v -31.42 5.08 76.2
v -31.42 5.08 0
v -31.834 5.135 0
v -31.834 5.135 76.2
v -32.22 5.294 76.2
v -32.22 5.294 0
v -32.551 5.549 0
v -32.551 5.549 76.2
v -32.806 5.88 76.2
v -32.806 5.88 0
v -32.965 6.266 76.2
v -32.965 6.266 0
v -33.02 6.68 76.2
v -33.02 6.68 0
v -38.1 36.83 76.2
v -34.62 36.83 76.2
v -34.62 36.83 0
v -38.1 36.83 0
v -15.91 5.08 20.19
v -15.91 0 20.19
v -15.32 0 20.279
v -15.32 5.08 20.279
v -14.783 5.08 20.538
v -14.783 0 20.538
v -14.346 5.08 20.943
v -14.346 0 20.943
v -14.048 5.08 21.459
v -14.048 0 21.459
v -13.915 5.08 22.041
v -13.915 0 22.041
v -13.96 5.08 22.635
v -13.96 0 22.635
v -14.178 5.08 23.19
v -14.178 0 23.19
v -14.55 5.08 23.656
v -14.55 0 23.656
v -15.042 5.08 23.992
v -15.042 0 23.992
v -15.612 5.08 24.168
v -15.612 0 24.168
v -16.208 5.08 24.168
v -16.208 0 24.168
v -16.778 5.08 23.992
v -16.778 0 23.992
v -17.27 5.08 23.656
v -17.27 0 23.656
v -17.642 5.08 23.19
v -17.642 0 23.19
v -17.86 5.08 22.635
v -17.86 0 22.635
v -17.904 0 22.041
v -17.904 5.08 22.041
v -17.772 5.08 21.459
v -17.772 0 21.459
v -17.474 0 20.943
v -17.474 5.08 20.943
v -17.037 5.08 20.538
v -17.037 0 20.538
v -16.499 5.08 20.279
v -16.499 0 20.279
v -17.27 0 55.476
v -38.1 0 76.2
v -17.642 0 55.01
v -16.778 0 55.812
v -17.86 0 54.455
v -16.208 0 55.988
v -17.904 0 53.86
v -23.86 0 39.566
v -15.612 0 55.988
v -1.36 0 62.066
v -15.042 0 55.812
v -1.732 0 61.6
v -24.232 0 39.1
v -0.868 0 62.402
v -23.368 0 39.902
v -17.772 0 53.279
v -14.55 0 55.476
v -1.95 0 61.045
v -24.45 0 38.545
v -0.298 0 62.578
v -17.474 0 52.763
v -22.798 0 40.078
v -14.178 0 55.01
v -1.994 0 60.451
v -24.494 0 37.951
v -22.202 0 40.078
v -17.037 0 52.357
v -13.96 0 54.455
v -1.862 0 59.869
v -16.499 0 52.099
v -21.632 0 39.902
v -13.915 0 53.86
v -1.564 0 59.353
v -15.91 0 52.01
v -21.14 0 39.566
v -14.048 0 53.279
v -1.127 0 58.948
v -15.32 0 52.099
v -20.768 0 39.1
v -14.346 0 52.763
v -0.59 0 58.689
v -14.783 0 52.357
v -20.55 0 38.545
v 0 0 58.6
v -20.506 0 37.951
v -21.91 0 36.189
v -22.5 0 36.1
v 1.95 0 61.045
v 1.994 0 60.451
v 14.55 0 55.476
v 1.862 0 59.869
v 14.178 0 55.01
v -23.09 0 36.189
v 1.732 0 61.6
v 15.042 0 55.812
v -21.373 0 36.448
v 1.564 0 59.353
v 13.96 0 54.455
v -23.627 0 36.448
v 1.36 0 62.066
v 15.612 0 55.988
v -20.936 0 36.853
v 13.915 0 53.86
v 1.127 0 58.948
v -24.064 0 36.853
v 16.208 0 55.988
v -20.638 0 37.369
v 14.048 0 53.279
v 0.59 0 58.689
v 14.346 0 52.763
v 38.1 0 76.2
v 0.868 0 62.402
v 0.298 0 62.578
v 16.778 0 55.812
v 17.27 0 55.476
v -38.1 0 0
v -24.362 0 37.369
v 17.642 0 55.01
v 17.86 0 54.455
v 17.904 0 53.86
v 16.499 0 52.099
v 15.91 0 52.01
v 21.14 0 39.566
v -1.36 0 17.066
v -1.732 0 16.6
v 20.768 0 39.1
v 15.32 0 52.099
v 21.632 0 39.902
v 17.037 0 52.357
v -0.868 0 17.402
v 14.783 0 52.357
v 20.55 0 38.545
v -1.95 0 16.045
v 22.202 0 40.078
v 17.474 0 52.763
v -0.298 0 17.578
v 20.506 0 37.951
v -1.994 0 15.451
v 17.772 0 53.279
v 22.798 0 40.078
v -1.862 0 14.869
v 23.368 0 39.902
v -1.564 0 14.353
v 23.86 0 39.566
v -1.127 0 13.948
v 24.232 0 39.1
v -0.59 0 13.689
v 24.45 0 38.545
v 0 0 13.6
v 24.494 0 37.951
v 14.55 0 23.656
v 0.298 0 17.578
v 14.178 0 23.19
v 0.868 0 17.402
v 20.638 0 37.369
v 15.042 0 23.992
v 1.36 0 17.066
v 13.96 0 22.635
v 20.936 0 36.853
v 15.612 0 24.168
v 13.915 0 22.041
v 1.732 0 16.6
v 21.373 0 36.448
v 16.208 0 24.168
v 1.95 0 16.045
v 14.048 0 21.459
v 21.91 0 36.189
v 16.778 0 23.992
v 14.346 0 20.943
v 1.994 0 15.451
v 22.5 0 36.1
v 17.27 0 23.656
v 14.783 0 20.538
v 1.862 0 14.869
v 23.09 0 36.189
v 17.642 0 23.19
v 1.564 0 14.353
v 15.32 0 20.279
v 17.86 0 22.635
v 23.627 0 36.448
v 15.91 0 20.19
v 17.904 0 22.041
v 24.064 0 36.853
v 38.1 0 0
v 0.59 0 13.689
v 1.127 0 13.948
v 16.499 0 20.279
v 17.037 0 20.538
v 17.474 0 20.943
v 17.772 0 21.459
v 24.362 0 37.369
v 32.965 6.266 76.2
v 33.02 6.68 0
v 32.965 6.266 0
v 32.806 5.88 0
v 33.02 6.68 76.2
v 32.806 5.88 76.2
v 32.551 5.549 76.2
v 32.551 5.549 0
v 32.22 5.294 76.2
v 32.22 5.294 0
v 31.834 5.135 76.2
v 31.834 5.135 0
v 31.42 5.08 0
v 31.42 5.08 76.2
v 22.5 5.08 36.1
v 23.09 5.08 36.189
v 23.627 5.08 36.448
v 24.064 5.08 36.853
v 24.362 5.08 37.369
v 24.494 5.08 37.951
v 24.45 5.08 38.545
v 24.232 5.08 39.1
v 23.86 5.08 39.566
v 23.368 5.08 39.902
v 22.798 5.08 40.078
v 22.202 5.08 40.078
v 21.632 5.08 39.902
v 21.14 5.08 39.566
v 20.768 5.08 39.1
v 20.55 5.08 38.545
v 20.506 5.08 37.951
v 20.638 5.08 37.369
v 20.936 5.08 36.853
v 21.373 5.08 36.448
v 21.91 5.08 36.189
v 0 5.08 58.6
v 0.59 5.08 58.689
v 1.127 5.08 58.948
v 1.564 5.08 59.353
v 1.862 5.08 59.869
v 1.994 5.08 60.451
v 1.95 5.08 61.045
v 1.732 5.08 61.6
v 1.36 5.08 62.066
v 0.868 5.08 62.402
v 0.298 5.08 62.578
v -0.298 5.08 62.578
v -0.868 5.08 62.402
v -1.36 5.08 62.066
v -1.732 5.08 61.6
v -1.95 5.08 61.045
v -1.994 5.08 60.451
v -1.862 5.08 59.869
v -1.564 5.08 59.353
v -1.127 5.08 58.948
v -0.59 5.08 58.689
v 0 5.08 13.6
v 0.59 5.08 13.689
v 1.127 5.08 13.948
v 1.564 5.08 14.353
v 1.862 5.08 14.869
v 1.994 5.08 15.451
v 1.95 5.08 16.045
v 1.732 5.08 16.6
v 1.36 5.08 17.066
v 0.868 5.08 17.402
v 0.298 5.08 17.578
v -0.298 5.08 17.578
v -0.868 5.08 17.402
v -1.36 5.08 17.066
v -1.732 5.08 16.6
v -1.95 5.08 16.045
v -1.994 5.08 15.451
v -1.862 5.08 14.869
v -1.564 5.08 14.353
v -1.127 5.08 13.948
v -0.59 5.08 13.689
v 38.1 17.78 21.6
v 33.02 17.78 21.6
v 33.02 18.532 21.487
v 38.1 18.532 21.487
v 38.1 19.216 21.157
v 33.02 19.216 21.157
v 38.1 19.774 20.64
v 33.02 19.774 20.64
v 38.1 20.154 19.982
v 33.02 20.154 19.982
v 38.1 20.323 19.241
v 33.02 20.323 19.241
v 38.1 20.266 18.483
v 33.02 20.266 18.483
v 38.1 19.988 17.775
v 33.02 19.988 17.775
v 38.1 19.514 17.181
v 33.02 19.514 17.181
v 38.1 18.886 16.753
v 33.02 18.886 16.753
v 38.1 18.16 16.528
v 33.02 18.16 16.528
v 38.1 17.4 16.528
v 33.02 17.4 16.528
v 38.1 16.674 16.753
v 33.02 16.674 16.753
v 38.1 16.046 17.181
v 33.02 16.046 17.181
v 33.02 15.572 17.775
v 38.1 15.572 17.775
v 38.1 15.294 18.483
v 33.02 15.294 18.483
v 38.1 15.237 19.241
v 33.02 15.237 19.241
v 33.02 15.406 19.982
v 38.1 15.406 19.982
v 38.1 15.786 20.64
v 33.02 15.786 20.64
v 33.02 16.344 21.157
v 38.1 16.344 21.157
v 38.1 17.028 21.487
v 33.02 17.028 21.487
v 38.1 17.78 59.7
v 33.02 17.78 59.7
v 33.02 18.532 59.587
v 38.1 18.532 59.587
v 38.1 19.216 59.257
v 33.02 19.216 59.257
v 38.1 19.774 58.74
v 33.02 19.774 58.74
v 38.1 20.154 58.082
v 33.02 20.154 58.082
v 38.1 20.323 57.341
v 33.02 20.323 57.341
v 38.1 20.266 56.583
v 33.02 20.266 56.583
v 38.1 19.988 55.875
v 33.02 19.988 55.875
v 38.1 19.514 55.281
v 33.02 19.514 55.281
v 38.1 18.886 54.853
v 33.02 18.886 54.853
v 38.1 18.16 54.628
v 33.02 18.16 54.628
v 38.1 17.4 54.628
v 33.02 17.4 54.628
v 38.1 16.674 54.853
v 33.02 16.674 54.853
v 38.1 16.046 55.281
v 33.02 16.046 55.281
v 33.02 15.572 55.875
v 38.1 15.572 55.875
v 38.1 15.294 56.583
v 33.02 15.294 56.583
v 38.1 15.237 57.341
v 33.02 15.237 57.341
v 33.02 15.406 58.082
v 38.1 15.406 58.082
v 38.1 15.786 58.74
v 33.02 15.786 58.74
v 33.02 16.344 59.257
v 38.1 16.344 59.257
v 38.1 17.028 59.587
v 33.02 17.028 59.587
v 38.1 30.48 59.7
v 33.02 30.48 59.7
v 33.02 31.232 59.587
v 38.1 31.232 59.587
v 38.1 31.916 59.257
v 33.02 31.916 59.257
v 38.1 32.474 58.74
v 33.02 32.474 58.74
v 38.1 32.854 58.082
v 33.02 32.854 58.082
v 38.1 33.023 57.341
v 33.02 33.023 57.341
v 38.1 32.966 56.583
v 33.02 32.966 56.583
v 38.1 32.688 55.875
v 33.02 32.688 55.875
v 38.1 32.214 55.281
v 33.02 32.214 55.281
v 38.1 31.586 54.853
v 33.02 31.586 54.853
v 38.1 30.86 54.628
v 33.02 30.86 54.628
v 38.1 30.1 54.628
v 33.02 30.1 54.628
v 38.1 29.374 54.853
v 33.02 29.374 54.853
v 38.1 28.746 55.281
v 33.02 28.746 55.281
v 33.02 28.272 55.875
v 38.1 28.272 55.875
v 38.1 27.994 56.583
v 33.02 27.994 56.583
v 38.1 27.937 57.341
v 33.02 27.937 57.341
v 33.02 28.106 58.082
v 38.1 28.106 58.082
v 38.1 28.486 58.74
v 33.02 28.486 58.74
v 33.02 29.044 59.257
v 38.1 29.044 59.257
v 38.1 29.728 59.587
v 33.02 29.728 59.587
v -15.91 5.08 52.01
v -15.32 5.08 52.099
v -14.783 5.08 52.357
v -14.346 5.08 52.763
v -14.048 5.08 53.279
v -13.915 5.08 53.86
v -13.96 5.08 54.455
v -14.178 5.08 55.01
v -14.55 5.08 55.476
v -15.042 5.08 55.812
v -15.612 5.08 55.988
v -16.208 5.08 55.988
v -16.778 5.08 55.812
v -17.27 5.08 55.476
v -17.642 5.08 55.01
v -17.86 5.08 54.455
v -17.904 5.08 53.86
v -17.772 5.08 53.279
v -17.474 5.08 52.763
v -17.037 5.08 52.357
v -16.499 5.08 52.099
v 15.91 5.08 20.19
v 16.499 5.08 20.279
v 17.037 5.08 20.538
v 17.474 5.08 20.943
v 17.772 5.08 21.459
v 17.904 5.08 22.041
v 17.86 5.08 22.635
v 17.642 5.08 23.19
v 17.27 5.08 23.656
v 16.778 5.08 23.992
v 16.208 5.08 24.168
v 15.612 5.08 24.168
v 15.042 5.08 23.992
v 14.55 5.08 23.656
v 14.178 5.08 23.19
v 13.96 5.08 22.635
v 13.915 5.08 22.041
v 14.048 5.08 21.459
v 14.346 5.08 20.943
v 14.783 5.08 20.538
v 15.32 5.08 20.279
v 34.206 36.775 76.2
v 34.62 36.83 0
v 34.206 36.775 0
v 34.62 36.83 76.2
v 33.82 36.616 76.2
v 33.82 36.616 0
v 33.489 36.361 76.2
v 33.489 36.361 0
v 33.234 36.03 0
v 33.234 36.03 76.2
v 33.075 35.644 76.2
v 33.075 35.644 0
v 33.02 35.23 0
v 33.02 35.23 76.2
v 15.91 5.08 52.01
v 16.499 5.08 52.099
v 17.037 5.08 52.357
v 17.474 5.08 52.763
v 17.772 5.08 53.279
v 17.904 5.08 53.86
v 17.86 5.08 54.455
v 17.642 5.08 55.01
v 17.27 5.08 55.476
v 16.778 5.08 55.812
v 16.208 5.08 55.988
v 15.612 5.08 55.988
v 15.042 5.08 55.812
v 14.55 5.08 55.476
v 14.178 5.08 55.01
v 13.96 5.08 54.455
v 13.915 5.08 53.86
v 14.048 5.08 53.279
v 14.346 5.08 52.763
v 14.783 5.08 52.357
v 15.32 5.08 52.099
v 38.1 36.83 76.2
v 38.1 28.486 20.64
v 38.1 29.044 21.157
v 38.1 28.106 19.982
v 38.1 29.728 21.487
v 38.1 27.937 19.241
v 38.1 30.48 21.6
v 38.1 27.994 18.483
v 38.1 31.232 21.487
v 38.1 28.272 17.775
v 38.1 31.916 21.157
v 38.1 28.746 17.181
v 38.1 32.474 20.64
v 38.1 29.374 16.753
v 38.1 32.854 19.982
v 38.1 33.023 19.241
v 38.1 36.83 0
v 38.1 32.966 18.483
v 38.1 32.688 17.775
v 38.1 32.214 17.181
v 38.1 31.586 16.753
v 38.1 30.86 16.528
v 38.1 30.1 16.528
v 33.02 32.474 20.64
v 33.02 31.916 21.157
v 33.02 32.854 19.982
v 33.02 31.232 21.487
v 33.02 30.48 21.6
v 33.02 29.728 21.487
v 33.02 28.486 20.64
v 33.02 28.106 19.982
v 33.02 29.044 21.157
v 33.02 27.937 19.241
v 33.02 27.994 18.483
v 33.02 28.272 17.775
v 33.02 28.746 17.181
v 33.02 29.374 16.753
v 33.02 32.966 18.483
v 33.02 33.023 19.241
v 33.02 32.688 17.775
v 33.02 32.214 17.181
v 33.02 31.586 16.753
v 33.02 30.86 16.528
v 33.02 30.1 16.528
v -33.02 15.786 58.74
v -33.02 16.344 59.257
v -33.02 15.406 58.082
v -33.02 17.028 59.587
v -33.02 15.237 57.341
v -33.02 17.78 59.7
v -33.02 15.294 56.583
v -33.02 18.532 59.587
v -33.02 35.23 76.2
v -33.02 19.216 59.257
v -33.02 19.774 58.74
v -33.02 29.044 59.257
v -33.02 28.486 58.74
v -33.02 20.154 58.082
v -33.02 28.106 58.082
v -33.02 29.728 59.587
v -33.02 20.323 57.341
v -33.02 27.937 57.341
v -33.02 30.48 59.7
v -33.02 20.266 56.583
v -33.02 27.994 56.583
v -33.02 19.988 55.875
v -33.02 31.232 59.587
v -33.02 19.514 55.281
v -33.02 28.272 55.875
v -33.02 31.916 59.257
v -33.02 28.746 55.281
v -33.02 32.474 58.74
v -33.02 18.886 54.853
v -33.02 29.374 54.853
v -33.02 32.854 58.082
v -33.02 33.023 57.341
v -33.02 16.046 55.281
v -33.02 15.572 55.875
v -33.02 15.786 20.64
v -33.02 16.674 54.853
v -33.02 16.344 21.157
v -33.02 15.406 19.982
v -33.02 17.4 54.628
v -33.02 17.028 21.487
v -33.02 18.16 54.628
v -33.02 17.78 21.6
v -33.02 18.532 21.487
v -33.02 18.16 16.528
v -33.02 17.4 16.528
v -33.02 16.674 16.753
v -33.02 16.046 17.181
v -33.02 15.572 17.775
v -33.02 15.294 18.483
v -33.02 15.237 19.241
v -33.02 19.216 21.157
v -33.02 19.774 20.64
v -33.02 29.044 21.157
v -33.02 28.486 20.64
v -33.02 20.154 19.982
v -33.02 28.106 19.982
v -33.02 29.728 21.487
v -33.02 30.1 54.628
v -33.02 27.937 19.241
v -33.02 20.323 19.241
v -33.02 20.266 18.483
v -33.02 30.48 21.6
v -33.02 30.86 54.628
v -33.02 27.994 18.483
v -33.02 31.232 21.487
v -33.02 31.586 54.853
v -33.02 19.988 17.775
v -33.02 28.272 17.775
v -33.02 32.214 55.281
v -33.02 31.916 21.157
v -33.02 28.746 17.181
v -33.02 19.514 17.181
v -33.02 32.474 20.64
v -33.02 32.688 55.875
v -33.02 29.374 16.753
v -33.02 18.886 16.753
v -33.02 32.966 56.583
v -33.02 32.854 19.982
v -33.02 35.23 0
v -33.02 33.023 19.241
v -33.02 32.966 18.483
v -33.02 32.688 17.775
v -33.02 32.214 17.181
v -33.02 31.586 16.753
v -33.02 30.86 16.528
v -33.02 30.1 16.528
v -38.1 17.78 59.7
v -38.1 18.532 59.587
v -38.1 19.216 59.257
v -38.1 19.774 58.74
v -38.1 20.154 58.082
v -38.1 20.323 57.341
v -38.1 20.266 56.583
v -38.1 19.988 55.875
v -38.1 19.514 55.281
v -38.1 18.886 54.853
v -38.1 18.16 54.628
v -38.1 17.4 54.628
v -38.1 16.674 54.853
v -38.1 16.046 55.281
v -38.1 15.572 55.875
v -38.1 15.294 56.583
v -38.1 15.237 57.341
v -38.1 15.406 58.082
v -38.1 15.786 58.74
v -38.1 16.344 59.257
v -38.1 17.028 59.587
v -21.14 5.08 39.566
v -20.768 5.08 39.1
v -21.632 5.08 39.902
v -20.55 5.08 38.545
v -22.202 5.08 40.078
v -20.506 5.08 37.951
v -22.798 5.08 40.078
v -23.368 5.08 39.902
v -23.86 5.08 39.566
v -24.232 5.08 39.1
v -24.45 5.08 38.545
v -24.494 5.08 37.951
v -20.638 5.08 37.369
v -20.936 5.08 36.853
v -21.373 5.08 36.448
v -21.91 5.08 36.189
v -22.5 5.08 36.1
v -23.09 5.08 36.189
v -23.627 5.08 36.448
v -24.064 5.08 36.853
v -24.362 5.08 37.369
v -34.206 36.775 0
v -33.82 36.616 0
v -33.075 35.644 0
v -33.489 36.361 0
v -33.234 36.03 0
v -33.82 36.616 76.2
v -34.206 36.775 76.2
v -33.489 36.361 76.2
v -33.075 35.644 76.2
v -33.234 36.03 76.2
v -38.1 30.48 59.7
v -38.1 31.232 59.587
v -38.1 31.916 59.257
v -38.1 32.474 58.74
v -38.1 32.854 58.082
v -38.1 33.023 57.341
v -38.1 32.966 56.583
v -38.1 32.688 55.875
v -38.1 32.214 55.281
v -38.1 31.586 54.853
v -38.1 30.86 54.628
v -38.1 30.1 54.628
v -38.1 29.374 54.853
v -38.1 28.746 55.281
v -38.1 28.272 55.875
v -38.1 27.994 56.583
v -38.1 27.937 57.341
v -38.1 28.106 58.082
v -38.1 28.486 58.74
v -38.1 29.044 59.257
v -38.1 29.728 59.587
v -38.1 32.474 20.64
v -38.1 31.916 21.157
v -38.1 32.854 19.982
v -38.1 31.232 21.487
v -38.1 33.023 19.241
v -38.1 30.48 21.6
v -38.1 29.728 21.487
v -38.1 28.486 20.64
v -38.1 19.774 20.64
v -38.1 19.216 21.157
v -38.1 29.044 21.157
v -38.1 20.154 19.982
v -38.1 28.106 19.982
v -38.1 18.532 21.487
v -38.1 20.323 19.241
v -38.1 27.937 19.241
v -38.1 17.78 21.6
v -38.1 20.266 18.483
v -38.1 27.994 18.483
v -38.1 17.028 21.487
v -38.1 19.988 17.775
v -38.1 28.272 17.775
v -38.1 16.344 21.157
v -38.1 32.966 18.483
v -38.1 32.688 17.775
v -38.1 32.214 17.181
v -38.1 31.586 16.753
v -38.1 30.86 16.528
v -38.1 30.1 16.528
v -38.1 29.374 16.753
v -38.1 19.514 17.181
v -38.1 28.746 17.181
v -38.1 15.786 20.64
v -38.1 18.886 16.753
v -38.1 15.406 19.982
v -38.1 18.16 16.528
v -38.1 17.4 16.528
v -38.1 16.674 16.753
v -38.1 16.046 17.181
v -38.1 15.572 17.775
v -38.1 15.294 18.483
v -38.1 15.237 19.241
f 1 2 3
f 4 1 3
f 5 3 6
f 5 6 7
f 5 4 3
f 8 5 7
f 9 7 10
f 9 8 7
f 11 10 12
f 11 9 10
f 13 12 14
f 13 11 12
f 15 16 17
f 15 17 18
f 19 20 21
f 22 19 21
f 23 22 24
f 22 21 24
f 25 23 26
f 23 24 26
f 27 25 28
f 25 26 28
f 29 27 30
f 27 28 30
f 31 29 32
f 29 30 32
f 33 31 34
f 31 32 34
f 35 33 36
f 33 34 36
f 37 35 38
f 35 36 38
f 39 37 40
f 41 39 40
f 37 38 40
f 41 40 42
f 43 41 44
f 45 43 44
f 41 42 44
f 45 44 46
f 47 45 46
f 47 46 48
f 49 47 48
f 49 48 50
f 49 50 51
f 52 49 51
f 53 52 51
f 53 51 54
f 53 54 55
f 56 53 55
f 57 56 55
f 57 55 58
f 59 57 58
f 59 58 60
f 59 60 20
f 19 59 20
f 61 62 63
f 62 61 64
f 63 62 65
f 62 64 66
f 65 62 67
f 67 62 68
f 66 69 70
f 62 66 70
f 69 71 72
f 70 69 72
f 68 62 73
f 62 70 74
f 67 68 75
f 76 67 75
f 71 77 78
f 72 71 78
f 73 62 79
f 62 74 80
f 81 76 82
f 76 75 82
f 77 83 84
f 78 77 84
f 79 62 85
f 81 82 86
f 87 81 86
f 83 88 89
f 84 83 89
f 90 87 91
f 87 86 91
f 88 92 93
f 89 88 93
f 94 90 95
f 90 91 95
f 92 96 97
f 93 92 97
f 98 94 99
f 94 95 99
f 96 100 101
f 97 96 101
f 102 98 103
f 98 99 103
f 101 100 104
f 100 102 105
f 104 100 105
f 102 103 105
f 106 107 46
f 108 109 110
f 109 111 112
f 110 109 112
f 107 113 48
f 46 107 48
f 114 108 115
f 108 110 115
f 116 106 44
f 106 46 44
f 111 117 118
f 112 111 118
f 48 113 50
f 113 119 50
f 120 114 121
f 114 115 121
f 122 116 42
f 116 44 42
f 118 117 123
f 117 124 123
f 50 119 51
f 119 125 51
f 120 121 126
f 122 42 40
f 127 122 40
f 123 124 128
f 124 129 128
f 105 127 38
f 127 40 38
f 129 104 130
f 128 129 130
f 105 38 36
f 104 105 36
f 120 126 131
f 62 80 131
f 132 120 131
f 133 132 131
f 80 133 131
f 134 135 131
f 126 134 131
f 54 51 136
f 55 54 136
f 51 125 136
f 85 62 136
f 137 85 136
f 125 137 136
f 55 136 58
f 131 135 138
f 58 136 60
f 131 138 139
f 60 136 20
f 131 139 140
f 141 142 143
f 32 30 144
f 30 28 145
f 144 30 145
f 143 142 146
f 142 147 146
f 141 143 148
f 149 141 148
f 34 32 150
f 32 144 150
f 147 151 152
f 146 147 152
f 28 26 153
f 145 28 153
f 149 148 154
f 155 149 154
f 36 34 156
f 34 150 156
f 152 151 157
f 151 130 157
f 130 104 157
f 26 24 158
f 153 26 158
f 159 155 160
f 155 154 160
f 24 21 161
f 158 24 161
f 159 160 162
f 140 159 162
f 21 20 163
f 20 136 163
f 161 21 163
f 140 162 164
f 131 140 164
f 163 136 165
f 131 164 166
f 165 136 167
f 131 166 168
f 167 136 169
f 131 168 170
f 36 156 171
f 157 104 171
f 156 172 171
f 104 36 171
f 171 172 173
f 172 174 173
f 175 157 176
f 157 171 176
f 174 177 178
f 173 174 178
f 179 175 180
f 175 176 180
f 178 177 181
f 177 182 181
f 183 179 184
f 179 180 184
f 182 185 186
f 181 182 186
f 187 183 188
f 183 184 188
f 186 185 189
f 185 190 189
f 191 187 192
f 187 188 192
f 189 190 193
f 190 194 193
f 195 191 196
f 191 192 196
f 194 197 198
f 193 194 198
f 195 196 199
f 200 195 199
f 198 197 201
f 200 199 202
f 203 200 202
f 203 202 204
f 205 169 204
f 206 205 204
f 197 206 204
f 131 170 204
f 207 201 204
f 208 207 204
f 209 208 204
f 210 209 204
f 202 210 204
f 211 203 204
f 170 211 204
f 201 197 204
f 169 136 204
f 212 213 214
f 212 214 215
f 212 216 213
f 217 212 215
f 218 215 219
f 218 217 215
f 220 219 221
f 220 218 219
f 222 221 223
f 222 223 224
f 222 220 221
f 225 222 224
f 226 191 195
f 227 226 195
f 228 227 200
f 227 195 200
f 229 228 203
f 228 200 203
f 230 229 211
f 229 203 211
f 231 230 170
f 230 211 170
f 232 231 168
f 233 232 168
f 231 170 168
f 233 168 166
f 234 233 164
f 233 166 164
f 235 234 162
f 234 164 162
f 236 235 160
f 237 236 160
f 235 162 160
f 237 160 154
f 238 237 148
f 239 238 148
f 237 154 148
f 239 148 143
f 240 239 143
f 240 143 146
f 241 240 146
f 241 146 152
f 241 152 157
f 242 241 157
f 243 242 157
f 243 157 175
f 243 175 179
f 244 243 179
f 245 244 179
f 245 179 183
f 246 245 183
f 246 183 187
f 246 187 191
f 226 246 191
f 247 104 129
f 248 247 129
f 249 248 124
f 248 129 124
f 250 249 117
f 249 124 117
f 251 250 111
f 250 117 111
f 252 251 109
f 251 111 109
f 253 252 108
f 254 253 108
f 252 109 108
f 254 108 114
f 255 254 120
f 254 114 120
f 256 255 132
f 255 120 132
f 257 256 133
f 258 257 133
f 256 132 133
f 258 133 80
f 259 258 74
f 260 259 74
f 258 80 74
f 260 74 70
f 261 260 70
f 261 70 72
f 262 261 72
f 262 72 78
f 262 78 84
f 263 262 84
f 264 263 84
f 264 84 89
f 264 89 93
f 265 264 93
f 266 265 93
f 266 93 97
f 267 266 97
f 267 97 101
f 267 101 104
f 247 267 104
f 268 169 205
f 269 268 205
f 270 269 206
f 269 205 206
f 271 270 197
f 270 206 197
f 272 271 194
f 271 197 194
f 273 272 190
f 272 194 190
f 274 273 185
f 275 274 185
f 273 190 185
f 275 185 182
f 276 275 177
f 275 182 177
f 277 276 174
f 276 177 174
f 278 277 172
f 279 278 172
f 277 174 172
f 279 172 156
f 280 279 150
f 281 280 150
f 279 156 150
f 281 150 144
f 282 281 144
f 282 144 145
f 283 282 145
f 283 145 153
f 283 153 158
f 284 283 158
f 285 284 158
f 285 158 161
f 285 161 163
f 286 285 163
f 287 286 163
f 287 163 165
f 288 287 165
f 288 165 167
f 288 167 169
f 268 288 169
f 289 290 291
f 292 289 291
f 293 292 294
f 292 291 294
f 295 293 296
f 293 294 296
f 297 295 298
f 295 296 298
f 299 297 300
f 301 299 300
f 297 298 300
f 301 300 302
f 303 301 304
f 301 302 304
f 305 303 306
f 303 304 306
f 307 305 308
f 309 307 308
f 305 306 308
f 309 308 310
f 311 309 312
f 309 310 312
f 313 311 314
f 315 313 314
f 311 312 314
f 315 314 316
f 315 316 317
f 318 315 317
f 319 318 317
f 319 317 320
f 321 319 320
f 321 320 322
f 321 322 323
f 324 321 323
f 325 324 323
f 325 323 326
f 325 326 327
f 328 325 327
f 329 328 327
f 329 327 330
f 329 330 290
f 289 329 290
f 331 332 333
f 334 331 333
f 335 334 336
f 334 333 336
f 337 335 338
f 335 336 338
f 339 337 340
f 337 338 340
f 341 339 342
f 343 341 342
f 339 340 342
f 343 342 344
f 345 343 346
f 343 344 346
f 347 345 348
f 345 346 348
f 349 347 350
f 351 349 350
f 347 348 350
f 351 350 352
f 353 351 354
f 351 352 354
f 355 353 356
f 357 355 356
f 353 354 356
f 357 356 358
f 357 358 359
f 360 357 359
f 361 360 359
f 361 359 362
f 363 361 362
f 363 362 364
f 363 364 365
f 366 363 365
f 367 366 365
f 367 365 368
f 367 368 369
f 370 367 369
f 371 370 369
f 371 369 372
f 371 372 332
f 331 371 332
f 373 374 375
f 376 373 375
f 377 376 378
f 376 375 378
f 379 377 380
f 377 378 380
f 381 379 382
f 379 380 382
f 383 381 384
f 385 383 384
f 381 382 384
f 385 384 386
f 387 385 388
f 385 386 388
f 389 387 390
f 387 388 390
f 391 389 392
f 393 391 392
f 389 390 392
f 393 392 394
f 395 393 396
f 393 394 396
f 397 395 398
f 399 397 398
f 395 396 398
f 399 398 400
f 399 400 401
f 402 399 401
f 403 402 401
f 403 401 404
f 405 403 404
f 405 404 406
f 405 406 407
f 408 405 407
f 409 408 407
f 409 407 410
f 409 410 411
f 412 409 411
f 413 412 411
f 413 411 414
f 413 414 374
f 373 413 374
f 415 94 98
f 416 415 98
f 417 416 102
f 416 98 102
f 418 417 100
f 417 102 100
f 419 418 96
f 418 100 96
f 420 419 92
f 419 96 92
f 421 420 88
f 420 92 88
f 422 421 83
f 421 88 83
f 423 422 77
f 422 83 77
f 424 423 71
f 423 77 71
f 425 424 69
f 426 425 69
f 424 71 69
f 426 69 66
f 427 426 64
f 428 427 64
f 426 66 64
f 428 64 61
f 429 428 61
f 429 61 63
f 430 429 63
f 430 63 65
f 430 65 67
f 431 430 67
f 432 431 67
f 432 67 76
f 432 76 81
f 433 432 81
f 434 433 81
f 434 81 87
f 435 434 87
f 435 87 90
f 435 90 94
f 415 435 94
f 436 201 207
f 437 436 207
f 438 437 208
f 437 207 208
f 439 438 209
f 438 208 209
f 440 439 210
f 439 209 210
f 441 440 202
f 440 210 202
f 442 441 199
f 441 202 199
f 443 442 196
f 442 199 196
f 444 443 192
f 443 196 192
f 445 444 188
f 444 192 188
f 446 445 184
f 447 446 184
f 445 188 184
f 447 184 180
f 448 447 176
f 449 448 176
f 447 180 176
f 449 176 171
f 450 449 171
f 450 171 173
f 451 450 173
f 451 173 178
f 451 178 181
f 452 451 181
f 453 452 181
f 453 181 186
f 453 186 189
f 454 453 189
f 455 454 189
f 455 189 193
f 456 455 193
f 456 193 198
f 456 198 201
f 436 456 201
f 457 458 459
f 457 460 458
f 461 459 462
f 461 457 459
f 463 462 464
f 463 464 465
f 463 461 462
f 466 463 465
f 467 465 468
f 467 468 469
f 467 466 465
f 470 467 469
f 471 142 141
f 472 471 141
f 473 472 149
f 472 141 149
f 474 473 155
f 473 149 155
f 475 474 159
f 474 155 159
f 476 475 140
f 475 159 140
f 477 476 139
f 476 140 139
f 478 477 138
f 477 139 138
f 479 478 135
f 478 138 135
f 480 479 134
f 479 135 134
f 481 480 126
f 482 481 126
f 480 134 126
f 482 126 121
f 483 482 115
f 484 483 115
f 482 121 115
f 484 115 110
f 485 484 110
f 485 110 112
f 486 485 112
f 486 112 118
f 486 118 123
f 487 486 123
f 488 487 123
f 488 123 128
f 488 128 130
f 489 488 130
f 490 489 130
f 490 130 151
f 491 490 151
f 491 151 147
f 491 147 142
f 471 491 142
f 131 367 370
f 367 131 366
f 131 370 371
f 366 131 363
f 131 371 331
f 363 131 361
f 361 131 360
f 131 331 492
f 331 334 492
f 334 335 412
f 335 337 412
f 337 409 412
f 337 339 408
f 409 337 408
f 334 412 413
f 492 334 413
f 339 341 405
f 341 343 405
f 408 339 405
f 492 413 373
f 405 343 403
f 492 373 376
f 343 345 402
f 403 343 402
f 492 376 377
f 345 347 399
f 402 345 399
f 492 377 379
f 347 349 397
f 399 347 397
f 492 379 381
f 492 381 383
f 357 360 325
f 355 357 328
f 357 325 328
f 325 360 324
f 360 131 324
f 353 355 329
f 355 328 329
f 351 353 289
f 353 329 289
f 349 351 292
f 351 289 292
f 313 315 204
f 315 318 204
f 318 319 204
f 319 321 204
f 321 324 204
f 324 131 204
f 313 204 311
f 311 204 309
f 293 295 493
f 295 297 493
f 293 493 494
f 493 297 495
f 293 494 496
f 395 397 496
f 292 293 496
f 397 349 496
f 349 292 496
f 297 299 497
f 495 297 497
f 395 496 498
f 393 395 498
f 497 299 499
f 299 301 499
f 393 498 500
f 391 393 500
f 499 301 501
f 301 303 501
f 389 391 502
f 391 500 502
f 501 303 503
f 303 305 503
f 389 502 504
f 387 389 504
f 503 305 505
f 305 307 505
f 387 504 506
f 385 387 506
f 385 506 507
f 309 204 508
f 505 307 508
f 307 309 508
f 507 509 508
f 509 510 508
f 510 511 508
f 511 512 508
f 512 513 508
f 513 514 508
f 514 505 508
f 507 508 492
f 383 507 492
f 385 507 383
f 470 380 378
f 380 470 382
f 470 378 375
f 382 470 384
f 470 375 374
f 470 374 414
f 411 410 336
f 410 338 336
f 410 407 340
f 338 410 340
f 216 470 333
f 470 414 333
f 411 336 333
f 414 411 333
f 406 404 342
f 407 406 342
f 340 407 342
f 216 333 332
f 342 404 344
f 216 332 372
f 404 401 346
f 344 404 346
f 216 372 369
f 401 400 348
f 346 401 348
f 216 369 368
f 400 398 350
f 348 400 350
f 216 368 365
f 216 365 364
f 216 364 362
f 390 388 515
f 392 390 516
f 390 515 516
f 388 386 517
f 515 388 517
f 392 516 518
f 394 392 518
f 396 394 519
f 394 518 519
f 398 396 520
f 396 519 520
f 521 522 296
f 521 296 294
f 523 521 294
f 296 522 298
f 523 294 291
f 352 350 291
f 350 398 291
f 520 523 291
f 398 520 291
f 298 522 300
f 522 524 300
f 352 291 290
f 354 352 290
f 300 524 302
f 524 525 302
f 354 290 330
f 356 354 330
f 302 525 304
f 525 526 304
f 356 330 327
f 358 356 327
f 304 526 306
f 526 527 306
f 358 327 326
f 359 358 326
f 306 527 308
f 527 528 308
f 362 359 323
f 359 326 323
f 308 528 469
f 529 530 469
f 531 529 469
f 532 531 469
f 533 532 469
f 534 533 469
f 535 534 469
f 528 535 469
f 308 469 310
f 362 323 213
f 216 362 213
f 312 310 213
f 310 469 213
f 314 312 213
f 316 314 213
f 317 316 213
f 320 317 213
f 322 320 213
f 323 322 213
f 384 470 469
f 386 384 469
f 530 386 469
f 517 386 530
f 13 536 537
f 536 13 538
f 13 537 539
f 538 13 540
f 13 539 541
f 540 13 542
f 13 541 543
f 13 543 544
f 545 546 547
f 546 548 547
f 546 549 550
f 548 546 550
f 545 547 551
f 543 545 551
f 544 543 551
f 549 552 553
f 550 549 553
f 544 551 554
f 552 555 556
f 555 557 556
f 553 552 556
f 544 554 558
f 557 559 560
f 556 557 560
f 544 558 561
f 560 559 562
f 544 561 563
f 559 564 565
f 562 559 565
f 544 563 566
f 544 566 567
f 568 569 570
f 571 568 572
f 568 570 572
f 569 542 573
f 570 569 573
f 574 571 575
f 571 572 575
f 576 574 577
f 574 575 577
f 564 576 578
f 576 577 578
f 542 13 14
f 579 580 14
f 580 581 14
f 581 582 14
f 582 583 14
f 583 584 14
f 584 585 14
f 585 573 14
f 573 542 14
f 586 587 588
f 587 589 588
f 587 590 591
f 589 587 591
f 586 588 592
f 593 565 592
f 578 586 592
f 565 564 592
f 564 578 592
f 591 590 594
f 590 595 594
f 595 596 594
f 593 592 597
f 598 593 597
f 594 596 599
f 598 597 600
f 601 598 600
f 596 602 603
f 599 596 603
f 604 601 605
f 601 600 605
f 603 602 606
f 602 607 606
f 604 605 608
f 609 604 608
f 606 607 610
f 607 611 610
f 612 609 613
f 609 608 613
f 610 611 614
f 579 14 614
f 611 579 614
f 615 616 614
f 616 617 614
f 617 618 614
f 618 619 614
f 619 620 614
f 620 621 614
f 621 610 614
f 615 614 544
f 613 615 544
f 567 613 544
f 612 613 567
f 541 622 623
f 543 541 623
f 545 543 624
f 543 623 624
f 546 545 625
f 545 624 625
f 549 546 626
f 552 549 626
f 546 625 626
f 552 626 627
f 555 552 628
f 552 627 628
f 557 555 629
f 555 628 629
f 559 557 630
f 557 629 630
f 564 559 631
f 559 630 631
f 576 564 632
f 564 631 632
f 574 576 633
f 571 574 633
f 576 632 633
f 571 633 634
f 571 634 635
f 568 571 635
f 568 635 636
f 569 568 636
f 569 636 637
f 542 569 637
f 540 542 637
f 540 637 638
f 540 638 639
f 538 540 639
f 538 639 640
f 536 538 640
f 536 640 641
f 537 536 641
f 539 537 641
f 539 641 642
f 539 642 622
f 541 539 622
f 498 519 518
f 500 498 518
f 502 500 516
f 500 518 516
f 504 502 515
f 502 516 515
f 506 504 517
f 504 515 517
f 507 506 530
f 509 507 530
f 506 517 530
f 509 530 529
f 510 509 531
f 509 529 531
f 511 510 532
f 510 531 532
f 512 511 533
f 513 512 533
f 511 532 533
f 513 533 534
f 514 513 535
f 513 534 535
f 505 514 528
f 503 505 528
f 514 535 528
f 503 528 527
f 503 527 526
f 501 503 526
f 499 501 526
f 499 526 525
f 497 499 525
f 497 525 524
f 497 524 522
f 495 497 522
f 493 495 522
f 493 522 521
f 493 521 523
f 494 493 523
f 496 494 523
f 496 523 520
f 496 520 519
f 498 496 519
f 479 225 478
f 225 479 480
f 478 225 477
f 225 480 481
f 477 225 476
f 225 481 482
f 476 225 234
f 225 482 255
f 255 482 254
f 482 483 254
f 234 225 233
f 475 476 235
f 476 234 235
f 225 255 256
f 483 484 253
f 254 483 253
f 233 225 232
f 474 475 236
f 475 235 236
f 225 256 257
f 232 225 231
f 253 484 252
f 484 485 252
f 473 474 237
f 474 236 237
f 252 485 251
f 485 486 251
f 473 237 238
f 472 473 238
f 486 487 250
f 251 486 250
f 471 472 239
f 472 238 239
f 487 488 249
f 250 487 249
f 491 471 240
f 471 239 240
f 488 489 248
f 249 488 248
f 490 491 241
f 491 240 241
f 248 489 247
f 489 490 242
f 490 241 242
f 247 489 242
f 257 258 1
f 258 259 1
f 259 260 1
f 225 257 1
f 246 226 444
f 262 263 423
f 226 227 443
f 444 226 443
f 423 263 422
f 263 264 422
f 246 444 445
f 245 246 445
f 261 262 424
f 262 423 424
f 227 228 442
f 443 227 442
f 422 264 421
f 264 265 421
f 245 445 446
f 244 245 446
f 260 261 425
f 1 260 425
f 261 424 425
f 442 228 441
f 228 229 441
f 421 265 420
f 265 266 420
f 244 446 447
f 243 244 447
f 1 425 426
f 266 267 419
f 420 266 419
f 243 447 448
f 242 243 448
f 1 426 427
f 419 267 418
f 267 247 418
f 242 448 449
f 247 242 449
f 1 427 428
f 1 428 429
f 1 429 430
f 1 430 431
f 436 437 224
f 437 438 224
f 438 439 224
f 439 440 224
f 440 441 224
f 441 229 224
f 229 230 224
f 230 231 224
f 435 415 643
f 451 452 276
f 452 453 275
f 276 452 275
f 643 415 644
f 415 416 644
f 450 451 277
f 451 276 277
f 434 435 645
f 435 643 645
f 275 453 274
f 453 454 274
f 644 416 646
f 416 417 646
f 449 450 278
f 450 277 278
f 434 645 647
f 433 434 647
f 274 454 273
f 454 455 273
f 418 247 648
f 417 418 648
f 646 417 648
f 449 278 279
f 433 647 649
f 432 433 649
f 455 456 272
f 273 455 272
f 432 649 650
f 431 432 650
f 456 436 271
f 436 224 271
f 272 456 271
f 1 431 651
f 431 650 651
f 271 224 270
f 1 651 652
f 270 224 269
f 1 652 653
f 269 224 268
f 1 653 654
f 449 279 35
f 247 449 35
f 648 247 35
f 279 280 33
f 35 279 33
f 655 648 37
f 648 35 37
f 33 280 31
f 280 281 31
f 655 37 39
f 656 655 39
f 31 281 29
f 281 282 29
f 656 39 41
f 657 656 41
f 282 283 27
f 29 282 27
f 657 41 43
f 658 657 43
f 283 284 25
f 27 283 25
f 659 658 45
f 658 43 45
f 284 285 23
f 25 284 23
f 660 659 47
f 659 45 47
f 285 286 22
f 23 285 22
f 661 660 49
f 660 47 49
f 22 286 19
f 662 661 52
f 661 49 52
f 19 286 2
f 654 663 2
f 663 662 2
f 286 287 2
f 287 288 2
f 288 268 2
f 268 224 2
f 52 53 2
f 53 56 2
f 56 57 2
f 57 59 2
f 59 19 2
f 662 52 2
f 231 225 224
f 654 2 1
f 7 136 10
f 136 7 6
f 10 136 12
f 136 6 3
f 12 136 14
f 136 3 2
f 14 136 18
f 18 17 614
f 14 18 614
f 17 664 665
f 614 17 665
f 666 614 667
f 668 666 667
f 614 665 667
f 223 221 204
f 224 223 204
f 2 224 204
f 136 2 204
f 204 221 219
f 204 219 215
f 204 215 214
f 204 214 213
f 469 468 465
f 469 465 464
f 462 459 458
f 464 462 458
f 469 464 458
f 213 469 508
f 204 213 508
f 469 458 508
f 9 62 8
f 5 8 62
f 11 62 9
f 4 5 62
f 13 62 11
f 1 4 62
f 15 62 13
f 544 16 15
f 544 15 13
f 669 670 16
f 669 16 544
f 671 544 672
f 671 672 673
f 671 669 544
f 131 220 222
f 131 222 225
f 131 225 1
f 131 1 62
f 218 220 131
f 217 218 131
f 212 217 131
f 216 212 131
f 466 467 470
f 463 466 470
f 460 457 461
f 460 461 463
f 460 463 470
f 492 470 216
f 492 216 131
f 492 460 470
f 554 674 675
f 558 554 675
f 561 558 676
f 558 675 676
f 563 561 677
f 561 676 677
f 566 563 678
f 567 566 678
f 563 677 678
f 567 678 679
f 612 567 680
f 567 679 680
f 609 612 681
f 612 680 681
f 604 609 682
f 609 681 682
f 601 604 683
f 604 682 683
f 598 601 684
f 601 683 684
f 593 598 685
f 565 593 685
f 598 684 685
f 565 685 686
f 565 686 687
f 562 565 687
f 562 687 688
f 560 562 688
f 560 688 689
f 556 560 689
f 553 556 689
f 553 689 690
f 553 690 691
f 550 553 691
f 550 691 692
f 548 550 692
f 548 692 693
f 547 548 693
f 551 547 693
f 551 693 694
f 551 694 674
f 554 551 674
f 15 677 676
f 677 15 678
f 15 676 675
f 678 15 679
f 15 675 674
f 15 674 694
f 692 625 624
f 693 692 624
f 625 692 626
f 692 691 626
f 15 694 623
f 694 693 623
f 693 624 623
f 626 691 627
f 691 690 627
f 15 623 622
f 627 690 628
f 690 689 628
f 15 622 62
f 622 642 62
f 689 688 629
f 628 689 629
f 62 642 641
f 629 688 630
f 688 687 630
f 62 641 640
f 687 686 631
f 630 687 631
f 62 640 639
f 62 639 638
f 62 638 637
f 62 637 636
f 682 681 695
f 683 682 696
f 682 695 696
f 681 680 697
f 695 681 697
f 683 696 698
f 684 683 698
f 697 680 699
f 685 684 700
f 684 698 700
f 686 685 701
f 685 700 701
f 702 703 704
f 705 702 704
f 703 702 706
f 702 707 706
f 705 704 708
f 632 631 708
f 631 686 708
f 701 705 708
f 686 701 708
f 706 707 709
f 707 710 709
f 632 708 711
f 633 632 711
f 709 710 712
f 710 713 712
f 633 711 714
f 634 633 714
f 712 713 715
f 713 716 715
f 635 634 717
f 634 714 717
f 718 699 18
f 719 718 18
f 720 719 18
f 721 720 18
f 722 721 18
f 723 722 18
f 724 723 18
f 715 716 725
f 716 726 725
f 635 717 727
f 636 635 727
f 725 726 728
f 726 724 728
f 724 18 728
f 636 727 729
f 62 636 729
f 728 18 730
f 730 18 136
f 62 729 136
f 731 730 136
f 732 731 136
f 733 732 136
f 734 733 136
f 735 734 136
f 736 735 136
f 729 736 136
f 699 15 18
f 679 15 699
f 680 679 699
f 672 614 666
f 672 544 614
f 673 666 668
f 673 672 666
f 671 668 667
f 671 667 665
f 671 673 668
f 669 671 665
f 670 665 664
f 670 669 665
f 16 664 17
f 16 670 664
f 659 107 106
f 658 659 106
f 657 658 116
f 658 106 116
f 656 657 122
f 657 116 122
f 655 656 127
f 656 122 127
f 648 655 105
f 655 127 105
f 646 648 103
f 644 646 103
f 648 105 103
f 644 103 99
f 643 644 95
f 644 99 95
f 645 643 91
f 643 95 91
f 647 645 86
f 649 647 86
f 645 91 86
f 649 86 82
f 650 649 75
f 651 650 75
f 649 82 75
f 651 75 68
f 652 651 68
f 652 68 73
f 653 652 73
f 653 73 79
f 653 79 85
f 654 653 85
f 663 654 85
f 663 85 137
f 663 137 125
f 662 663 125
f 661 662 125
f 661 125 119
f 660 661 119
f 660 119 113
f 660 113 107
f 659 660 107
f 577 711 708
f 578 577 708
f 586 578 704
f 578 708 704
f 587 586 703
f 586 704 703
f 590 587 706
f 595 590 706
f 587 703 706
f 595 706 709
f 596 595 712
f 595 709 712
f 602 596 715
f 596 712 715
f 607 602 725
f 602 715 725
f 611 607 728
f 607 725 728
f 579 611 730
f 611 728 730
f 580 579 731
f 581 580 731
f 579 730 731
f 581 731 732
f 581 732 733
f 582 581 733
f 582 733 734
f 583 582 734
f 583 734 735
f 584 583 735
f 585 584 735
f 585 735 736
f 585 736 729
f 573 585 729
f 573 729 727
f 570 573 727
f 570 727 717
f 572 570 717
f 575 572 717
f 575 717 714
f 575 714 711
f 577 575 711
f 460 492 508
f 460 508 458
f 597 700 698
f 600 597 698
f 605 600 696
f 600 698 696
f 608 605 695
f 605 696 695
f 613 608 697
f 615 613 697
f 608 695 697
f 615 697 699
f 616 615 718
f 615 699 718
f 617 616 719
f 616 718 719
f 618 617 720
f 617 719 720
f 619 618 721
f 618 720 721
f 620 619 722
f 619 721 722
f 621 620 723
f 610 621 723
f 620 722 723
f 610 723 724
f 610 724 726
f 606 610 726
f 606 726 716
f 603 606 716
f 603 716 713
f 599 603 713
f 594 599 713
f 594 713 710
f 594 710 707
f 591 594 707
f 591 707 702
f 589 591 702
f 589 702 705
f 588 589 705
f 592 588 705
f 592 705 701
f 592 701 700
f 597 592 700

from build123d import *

# Parameters (mm, degrees)
BOSS_EXTRUDE1_DEPTH = 76.2
FILLET1_R           = 1.6
SKETCH2_R           = 2
CUT_EXTRUDE2_DEPTH  = 93.814324864
SKETCH3_R           = 2.55
CUT_EXTRUDE3_DEPTH  = 114.882961412


with BuildPart() as part:
    # Sketch1 → Boss-Extrude1 (new body)
    with BuildSketch(Plane.XY):
        Polygon((-38.1, 0), (38.1, 0), (38.1, 3.175), (38.1, 36.83), (33.02, 36.83), (33.02, 5.08), (-33.02, 5.08), (-33.02, 36.83), (-38.1, 36.83), (-38.1, 4.389392044), align=None)
    extrude(amount=BOSS_EXTRUDE1_DEPTH)

    # Fillet1
    fillet1_edges = [part.edges().sort_by_distance(p)[0] for p in [
        (-33.02, 36.83, 38.1),
        (-33.02, 5.08, 38.1),
        (33.02, 5.08, 38.1),
        (33.02, 36.83, 38.1),
    ]]
    fillet(fillet1_edges, radius=FILLET1_R)

    # Sketch2 → Cut-Extrude2 (cut, through all)
    with BuildSketch(Plane.XZ):
        with Locations(Location((0, 60.6, 0), (0, 0, 270))):
            Circle(SKETCH2_R)
        with Locations(Location((15.909902577, 54.009902577, 0), (0, 0, 270))):
            Circle(SKETCH2_R)
        with Locations(Location((22.5, 38.1, 0), (0, 0, 270))):
            Circle(SKETCH2_R)
        with Locations(Location((15.909902577, 22.190097423, 0), (0, 0, 270))):
            Circle(SKETCH2_R)
        with Locations(Location((0, 15.6, 0), (0, 0, 270))):
            Circle(SKETCH2_R)
        with Locations(Location((-15.909902577, 22.190097423, 0), (0, 0, 270))):
            Circle(SKETCH2_R)
        with Locations(Location((-22.5, 38.1, 0), (0, 0, 270))):
            Circle(SKETCH2_R)
        with Locations(Location((-15.909902577, 54.009902577, 0), (0, 0, 270))):
            Circle(SKETCH2_R)
    extrude(amount=-CUT_EXTRUDE2_DEPTH, mode=Mode.SUBTRACT)

    # Sketch3 → Cut-Extrude3 (cut, through all)
    with BuildSketch(Plane.ZY.offset(38.1)):
        with Locations((19.05, 30.48)):
            Circle(SKETCH3_R)
        with Locations((19.05, 17.78)):
            Circle(SKETCH3_R)
        with Locations((57.15, 17.78)):
            Circle(SKETCH3_R)
        with Locations((57.15, 30.48)):
            Circle(SKETCH3_R)
    extrude(amount=-CUT_EXTRUDE3_DEPTH, mode=Mode.SUBTRACT)


solid = part.part
